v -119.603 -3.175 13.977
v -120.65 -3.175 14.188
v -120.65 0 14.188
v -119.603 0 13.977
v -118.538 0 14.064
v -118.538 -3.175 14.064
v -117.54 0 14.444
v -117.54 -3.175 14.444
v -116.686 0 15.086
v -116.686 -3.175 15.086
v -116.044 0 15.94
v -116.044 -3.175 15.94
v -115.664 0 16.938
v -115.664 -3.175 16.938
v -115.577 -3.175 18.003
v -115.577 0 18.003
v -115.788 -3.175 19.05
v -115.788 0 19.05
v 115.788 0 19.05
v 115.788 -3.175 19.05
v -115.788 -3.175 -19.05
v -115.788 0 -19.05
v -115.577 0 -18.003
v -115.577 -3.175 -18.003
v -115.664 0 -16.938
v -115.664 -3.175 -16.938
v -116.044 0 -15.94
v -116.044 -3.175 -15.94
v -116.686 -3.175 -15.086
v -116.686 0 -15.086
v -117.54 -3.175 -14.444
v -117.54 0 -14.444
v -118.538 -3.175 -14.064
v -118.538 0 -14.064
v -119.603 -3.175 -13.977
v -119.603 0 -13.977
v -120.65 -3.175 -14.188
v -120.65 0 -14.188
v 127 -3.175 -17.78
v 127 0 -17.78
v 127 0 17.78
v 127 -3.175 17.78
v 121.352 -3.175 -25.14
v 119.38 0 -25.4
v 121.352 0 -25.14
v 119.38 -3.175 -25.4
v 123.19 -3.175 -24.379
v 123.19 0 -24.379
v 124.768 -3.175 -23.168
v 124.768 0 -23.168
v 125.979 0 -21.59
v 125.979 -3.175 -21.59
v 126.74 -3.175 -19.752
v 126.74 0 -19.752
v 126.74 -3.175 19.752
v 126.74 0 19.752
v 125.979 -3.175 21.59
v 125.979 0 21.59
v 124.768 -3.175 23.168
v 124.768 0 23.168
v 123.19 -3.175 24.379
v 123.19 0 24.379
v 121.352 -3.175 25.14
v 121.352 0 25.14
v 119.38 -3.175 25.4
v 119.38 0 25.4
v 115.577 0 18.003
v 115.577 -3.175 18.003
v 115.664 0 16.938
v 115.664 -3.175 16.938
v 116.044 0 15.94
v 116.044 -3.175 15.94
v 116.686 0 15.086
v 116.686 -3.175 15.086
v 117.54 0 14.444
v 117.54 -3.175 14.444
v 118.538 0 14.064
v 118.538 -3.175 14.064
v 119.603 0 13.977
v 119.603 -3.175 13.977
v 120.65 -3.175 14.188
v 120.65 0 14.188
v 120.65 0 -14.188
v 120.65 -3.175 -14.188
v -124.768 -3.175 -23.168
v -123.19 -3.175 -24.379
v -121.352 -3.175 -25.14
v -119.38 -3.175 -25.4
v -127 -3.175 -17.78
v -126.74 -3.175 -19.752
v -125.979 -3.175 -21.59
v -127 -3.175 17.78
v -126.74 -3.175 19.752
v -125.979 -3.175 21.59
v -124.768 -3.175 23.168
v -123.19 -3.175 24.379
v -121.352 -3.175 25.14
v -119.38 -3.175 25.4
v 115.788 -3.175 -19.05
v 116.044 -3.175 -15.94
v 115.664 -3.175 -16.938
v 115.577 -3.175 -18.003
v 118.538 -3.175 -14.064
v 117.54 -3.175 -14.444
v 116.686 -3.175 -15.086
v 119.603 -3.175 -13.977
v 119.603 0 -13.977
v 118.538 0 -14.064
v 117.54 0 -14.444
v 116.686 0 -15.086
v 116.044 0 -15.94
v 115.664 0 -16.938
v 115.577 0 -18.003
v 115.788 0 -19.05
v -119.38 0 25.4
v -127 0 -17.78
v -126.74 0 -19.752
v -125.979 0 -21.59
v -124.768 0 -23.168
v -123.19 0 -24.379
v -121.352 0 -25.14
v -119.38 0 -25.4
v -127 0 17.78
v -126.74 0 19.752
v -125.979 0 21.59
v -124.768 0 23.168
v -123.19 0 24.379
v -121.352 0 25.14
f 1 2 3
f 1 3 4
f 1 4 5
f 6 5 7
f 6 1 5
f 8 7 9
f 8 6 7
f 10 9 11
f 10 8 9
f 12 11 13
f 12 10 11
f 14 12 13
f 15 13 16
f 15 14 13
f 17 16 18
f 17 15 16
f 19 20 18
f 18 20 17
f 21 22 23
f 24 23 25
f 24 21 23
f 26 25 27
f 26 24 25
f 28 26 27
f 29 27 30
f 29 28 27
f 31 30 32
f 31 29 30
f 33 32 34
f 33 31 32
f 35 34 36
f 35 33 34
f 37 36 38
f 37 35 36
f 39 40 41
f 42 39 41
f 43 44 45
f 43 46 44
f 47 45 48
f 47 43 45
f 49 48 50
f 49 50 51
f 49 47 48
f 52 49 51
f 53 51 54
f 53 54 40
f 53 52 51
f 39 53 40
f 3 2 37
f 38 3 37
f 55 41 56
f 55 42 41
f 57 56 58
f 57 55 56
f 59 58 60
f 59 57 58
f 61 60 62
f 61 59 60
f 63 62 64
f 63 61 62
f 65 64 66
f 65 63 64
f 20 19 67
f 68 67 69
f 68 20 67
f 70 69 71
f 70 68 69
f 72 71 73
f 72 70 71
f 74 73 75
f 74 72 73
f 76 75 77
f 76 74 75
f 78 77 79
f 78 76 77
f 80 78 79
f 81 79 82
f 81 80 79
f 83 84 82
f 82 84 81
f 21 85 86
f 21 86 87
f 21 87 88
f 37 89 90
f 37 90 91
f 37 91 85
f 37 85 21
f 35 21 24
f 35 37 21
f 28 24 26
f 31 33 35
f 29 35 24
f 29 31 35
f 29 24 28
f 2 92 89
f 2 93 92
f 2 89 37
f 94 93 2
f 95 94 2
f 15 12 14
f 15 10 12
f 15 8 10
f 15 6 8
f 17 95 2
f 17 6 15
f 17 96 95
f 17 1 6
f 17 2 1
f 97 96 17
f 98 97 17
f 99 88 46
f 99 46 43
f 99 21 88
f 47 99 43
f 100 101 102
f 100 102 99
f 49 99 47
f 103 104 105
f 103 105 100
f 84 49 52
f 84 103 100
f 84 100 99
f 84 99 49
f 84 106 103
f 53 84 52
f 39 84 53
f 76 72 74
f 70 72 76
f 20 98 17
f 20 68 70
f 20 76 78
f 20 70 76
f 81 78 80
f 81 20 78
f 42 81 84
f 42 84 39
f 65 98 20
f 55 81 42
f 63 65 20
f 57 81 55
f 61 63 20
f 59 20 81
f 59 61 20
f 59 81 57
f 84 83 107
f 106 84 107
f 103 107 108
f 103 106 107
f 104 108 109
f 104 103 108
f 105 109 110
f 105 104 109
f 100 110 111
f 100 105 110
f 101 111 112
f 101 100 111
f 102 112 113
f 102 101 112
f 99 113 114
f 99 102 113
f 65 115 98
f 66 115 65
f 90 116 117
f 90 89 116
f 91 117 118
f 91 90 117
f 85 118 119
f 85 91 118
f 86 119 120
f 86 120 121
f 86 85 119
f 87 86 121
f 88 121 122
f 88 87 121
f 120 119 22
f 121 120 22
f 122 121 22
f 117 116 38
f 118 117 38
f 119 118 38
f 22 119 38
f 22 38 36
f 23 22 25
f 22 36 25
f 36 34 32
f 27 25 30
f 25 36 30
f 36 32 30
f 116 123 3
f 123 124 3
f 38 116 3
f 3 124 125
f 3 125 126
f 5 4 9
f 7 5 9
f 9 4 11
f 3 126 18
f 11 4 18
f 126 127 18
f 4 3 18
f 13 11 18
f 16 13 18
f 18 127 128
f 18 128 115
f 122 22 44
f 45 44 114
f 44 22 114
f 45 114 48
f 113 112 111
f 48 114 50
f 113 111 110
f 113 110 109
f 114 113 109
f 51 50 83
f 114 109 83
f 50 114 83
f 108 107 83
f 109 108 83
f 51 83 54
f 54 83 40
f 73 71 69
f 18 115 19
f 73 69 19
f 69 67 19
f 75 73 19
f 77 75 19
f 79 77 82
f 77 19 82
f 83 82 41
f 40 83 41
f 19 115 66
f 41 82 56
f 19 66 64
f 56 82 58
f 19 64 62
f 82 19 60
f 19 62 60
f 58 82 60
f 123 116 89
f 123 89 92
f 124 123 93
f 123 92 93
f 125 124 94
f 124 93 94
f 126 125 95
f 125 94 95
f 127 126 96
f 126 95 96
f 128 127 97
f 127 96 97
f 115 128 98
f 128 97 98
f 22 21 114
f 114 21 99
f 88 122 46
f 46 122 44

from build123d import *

# Parameters (mm, degrees)
F0_W     = 254
F0_H     = 50.8
F1_DEPTH = 3.175
F2_R     = 7.62
F4_DEPTH = 25.4
F5_R     = 3.81
F6_DEPTH = 3.175


with BuildPart() as f1:
    # F0 (on Front) → F1 (new body)
    with BuildSketch(Plane.XZ):
        Rectangle(F0_W, F0_H)
    extrude(amount=F1_DEPTH)

    # F2
    f2_edges = [f1.edges().sort_by_distance(p)[0] for p in [
        (-127, -1.5875, 25.4),
        (-127, -1.5875, -25.4),
        (127, -1.5875, 25.4),
        (127, -1.5875, -25.4),
    ]]
    fillet(f2_edges, radius=F2_R)

    # F3 (on face) → F4 (cut)
    with BuildSketch(Plane.XZ.offset(3.175)):
        with BuildLine():
            Line((119.38, 19.05), (-119.38, 19.05))
            ThreePointArc((-119.38, 19.05), (-120.278026, 18.678026), (-120.65, 17.78))
            Line((-120.65, 17.78), (-120.65, -17.78))
            ThreePointArc((-120.65, -17.78), (-120.278026, -18.678026), (-119.38, -19.05))
            Line((-119.38, -19.05), (119.38, -19.05))
            ThreePointArc((119.38, -19.05), (120.278026, -18.678026), (120.65, -17.78))
            Line((120.65, -17.78), (120.65, 17.78))
            ThreePointArc((120.65, 17.78), (120.278026, 18.678026), (119.38, 19.05))
        make_face()
    extrude(amount=-F4_DEPTH, mode=Mode.SUBTRACT)

    # F5 (on face) → F6 (join)
    with BuildSketch(Plane.XZ.offset(3.175)):
        with Locations((-119.38, 17.78)):
            Circle(F5_R)
        with Locations((-119.38, -17.78)):
            Circle(F5_R)
        with Locations((119.38, 17.78)):
            Circle(F5_R)
        with Locations((119.38, -17.78)):
            Circle(F5_R)
    extrude(amount=-F6_DEPTH)


solid = f1.part
